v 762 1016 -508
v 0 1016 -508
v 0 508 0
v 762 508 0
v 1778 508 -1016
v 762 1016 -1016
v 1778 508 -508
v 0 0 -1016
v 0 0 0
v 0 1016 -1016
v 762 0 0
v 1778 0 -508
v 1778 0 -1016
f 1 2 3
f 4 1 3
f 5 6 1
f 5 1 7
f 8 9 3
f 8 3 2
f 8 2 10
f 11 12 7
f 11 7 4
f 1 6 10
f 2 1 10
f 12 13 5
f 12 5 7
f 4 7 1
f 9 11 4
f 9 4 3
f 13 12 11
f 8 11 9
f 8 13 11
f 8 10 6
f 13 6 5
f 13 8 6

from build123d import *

# Parameters (mm, degrees)
BOSS_EXTRUDE1_DEPTH = 1016
CUT_EXTRUDE1_DEPTH  = 2287
CUT_EXTRUDE2_DEPTH  = 2287


with BuildPart() as part:
    # Sketch1 → Boss-Extrude1 (new body)
    with BuildSketch(Plane(origin=(0, 0, 0), x_dir=(1, 0, 0), z_dir=(0, 1, 0))):
        Polygon((0, 0), (0, 1016), (1778, 1016), (1778, 508), (762, 0), align=None)
    extrude(amount=BOSS_EXTRUDE1_DEPTH)

    # Sketch2 → Cut-Extrude1 (cut, through all)
    with BuildSketch(Plane(origin=(0, 0, -1016), x_dir=(-1, 0, 0), z_dir=(0, 0, -1))):
        Polygon((-762, 1016), (-1778, 508), (-1778, 1016), align=None)
    extrude(amount=-CUT_EXTRUDE1_DEPTH, mode=Mode.SUBTRACT)

    # Sketch3 → Cut-Extrude2 (cut, through all)
    with BuildSketch(Plane.ZY):
        Polygon((-508, 1016), (0, 508), (0, 1016), align=None)
    extrude(amount=-CUT_EXTRUDE2_DEPTH, mode=Mode.SUBTRACT)

    # SurfaceCut1
    split(bisect_by=Plane(origin=(197.555555556, 395.111111111, 395.111111111), x_dir=(-0.9428090415820636, 0.23570226039551598, 0.235702260395515), z_dir=(-0.33333333333333287, -0.6666666666666685, -0.6666666666666652)), keep=Keep.TOP)


solid = part.part
